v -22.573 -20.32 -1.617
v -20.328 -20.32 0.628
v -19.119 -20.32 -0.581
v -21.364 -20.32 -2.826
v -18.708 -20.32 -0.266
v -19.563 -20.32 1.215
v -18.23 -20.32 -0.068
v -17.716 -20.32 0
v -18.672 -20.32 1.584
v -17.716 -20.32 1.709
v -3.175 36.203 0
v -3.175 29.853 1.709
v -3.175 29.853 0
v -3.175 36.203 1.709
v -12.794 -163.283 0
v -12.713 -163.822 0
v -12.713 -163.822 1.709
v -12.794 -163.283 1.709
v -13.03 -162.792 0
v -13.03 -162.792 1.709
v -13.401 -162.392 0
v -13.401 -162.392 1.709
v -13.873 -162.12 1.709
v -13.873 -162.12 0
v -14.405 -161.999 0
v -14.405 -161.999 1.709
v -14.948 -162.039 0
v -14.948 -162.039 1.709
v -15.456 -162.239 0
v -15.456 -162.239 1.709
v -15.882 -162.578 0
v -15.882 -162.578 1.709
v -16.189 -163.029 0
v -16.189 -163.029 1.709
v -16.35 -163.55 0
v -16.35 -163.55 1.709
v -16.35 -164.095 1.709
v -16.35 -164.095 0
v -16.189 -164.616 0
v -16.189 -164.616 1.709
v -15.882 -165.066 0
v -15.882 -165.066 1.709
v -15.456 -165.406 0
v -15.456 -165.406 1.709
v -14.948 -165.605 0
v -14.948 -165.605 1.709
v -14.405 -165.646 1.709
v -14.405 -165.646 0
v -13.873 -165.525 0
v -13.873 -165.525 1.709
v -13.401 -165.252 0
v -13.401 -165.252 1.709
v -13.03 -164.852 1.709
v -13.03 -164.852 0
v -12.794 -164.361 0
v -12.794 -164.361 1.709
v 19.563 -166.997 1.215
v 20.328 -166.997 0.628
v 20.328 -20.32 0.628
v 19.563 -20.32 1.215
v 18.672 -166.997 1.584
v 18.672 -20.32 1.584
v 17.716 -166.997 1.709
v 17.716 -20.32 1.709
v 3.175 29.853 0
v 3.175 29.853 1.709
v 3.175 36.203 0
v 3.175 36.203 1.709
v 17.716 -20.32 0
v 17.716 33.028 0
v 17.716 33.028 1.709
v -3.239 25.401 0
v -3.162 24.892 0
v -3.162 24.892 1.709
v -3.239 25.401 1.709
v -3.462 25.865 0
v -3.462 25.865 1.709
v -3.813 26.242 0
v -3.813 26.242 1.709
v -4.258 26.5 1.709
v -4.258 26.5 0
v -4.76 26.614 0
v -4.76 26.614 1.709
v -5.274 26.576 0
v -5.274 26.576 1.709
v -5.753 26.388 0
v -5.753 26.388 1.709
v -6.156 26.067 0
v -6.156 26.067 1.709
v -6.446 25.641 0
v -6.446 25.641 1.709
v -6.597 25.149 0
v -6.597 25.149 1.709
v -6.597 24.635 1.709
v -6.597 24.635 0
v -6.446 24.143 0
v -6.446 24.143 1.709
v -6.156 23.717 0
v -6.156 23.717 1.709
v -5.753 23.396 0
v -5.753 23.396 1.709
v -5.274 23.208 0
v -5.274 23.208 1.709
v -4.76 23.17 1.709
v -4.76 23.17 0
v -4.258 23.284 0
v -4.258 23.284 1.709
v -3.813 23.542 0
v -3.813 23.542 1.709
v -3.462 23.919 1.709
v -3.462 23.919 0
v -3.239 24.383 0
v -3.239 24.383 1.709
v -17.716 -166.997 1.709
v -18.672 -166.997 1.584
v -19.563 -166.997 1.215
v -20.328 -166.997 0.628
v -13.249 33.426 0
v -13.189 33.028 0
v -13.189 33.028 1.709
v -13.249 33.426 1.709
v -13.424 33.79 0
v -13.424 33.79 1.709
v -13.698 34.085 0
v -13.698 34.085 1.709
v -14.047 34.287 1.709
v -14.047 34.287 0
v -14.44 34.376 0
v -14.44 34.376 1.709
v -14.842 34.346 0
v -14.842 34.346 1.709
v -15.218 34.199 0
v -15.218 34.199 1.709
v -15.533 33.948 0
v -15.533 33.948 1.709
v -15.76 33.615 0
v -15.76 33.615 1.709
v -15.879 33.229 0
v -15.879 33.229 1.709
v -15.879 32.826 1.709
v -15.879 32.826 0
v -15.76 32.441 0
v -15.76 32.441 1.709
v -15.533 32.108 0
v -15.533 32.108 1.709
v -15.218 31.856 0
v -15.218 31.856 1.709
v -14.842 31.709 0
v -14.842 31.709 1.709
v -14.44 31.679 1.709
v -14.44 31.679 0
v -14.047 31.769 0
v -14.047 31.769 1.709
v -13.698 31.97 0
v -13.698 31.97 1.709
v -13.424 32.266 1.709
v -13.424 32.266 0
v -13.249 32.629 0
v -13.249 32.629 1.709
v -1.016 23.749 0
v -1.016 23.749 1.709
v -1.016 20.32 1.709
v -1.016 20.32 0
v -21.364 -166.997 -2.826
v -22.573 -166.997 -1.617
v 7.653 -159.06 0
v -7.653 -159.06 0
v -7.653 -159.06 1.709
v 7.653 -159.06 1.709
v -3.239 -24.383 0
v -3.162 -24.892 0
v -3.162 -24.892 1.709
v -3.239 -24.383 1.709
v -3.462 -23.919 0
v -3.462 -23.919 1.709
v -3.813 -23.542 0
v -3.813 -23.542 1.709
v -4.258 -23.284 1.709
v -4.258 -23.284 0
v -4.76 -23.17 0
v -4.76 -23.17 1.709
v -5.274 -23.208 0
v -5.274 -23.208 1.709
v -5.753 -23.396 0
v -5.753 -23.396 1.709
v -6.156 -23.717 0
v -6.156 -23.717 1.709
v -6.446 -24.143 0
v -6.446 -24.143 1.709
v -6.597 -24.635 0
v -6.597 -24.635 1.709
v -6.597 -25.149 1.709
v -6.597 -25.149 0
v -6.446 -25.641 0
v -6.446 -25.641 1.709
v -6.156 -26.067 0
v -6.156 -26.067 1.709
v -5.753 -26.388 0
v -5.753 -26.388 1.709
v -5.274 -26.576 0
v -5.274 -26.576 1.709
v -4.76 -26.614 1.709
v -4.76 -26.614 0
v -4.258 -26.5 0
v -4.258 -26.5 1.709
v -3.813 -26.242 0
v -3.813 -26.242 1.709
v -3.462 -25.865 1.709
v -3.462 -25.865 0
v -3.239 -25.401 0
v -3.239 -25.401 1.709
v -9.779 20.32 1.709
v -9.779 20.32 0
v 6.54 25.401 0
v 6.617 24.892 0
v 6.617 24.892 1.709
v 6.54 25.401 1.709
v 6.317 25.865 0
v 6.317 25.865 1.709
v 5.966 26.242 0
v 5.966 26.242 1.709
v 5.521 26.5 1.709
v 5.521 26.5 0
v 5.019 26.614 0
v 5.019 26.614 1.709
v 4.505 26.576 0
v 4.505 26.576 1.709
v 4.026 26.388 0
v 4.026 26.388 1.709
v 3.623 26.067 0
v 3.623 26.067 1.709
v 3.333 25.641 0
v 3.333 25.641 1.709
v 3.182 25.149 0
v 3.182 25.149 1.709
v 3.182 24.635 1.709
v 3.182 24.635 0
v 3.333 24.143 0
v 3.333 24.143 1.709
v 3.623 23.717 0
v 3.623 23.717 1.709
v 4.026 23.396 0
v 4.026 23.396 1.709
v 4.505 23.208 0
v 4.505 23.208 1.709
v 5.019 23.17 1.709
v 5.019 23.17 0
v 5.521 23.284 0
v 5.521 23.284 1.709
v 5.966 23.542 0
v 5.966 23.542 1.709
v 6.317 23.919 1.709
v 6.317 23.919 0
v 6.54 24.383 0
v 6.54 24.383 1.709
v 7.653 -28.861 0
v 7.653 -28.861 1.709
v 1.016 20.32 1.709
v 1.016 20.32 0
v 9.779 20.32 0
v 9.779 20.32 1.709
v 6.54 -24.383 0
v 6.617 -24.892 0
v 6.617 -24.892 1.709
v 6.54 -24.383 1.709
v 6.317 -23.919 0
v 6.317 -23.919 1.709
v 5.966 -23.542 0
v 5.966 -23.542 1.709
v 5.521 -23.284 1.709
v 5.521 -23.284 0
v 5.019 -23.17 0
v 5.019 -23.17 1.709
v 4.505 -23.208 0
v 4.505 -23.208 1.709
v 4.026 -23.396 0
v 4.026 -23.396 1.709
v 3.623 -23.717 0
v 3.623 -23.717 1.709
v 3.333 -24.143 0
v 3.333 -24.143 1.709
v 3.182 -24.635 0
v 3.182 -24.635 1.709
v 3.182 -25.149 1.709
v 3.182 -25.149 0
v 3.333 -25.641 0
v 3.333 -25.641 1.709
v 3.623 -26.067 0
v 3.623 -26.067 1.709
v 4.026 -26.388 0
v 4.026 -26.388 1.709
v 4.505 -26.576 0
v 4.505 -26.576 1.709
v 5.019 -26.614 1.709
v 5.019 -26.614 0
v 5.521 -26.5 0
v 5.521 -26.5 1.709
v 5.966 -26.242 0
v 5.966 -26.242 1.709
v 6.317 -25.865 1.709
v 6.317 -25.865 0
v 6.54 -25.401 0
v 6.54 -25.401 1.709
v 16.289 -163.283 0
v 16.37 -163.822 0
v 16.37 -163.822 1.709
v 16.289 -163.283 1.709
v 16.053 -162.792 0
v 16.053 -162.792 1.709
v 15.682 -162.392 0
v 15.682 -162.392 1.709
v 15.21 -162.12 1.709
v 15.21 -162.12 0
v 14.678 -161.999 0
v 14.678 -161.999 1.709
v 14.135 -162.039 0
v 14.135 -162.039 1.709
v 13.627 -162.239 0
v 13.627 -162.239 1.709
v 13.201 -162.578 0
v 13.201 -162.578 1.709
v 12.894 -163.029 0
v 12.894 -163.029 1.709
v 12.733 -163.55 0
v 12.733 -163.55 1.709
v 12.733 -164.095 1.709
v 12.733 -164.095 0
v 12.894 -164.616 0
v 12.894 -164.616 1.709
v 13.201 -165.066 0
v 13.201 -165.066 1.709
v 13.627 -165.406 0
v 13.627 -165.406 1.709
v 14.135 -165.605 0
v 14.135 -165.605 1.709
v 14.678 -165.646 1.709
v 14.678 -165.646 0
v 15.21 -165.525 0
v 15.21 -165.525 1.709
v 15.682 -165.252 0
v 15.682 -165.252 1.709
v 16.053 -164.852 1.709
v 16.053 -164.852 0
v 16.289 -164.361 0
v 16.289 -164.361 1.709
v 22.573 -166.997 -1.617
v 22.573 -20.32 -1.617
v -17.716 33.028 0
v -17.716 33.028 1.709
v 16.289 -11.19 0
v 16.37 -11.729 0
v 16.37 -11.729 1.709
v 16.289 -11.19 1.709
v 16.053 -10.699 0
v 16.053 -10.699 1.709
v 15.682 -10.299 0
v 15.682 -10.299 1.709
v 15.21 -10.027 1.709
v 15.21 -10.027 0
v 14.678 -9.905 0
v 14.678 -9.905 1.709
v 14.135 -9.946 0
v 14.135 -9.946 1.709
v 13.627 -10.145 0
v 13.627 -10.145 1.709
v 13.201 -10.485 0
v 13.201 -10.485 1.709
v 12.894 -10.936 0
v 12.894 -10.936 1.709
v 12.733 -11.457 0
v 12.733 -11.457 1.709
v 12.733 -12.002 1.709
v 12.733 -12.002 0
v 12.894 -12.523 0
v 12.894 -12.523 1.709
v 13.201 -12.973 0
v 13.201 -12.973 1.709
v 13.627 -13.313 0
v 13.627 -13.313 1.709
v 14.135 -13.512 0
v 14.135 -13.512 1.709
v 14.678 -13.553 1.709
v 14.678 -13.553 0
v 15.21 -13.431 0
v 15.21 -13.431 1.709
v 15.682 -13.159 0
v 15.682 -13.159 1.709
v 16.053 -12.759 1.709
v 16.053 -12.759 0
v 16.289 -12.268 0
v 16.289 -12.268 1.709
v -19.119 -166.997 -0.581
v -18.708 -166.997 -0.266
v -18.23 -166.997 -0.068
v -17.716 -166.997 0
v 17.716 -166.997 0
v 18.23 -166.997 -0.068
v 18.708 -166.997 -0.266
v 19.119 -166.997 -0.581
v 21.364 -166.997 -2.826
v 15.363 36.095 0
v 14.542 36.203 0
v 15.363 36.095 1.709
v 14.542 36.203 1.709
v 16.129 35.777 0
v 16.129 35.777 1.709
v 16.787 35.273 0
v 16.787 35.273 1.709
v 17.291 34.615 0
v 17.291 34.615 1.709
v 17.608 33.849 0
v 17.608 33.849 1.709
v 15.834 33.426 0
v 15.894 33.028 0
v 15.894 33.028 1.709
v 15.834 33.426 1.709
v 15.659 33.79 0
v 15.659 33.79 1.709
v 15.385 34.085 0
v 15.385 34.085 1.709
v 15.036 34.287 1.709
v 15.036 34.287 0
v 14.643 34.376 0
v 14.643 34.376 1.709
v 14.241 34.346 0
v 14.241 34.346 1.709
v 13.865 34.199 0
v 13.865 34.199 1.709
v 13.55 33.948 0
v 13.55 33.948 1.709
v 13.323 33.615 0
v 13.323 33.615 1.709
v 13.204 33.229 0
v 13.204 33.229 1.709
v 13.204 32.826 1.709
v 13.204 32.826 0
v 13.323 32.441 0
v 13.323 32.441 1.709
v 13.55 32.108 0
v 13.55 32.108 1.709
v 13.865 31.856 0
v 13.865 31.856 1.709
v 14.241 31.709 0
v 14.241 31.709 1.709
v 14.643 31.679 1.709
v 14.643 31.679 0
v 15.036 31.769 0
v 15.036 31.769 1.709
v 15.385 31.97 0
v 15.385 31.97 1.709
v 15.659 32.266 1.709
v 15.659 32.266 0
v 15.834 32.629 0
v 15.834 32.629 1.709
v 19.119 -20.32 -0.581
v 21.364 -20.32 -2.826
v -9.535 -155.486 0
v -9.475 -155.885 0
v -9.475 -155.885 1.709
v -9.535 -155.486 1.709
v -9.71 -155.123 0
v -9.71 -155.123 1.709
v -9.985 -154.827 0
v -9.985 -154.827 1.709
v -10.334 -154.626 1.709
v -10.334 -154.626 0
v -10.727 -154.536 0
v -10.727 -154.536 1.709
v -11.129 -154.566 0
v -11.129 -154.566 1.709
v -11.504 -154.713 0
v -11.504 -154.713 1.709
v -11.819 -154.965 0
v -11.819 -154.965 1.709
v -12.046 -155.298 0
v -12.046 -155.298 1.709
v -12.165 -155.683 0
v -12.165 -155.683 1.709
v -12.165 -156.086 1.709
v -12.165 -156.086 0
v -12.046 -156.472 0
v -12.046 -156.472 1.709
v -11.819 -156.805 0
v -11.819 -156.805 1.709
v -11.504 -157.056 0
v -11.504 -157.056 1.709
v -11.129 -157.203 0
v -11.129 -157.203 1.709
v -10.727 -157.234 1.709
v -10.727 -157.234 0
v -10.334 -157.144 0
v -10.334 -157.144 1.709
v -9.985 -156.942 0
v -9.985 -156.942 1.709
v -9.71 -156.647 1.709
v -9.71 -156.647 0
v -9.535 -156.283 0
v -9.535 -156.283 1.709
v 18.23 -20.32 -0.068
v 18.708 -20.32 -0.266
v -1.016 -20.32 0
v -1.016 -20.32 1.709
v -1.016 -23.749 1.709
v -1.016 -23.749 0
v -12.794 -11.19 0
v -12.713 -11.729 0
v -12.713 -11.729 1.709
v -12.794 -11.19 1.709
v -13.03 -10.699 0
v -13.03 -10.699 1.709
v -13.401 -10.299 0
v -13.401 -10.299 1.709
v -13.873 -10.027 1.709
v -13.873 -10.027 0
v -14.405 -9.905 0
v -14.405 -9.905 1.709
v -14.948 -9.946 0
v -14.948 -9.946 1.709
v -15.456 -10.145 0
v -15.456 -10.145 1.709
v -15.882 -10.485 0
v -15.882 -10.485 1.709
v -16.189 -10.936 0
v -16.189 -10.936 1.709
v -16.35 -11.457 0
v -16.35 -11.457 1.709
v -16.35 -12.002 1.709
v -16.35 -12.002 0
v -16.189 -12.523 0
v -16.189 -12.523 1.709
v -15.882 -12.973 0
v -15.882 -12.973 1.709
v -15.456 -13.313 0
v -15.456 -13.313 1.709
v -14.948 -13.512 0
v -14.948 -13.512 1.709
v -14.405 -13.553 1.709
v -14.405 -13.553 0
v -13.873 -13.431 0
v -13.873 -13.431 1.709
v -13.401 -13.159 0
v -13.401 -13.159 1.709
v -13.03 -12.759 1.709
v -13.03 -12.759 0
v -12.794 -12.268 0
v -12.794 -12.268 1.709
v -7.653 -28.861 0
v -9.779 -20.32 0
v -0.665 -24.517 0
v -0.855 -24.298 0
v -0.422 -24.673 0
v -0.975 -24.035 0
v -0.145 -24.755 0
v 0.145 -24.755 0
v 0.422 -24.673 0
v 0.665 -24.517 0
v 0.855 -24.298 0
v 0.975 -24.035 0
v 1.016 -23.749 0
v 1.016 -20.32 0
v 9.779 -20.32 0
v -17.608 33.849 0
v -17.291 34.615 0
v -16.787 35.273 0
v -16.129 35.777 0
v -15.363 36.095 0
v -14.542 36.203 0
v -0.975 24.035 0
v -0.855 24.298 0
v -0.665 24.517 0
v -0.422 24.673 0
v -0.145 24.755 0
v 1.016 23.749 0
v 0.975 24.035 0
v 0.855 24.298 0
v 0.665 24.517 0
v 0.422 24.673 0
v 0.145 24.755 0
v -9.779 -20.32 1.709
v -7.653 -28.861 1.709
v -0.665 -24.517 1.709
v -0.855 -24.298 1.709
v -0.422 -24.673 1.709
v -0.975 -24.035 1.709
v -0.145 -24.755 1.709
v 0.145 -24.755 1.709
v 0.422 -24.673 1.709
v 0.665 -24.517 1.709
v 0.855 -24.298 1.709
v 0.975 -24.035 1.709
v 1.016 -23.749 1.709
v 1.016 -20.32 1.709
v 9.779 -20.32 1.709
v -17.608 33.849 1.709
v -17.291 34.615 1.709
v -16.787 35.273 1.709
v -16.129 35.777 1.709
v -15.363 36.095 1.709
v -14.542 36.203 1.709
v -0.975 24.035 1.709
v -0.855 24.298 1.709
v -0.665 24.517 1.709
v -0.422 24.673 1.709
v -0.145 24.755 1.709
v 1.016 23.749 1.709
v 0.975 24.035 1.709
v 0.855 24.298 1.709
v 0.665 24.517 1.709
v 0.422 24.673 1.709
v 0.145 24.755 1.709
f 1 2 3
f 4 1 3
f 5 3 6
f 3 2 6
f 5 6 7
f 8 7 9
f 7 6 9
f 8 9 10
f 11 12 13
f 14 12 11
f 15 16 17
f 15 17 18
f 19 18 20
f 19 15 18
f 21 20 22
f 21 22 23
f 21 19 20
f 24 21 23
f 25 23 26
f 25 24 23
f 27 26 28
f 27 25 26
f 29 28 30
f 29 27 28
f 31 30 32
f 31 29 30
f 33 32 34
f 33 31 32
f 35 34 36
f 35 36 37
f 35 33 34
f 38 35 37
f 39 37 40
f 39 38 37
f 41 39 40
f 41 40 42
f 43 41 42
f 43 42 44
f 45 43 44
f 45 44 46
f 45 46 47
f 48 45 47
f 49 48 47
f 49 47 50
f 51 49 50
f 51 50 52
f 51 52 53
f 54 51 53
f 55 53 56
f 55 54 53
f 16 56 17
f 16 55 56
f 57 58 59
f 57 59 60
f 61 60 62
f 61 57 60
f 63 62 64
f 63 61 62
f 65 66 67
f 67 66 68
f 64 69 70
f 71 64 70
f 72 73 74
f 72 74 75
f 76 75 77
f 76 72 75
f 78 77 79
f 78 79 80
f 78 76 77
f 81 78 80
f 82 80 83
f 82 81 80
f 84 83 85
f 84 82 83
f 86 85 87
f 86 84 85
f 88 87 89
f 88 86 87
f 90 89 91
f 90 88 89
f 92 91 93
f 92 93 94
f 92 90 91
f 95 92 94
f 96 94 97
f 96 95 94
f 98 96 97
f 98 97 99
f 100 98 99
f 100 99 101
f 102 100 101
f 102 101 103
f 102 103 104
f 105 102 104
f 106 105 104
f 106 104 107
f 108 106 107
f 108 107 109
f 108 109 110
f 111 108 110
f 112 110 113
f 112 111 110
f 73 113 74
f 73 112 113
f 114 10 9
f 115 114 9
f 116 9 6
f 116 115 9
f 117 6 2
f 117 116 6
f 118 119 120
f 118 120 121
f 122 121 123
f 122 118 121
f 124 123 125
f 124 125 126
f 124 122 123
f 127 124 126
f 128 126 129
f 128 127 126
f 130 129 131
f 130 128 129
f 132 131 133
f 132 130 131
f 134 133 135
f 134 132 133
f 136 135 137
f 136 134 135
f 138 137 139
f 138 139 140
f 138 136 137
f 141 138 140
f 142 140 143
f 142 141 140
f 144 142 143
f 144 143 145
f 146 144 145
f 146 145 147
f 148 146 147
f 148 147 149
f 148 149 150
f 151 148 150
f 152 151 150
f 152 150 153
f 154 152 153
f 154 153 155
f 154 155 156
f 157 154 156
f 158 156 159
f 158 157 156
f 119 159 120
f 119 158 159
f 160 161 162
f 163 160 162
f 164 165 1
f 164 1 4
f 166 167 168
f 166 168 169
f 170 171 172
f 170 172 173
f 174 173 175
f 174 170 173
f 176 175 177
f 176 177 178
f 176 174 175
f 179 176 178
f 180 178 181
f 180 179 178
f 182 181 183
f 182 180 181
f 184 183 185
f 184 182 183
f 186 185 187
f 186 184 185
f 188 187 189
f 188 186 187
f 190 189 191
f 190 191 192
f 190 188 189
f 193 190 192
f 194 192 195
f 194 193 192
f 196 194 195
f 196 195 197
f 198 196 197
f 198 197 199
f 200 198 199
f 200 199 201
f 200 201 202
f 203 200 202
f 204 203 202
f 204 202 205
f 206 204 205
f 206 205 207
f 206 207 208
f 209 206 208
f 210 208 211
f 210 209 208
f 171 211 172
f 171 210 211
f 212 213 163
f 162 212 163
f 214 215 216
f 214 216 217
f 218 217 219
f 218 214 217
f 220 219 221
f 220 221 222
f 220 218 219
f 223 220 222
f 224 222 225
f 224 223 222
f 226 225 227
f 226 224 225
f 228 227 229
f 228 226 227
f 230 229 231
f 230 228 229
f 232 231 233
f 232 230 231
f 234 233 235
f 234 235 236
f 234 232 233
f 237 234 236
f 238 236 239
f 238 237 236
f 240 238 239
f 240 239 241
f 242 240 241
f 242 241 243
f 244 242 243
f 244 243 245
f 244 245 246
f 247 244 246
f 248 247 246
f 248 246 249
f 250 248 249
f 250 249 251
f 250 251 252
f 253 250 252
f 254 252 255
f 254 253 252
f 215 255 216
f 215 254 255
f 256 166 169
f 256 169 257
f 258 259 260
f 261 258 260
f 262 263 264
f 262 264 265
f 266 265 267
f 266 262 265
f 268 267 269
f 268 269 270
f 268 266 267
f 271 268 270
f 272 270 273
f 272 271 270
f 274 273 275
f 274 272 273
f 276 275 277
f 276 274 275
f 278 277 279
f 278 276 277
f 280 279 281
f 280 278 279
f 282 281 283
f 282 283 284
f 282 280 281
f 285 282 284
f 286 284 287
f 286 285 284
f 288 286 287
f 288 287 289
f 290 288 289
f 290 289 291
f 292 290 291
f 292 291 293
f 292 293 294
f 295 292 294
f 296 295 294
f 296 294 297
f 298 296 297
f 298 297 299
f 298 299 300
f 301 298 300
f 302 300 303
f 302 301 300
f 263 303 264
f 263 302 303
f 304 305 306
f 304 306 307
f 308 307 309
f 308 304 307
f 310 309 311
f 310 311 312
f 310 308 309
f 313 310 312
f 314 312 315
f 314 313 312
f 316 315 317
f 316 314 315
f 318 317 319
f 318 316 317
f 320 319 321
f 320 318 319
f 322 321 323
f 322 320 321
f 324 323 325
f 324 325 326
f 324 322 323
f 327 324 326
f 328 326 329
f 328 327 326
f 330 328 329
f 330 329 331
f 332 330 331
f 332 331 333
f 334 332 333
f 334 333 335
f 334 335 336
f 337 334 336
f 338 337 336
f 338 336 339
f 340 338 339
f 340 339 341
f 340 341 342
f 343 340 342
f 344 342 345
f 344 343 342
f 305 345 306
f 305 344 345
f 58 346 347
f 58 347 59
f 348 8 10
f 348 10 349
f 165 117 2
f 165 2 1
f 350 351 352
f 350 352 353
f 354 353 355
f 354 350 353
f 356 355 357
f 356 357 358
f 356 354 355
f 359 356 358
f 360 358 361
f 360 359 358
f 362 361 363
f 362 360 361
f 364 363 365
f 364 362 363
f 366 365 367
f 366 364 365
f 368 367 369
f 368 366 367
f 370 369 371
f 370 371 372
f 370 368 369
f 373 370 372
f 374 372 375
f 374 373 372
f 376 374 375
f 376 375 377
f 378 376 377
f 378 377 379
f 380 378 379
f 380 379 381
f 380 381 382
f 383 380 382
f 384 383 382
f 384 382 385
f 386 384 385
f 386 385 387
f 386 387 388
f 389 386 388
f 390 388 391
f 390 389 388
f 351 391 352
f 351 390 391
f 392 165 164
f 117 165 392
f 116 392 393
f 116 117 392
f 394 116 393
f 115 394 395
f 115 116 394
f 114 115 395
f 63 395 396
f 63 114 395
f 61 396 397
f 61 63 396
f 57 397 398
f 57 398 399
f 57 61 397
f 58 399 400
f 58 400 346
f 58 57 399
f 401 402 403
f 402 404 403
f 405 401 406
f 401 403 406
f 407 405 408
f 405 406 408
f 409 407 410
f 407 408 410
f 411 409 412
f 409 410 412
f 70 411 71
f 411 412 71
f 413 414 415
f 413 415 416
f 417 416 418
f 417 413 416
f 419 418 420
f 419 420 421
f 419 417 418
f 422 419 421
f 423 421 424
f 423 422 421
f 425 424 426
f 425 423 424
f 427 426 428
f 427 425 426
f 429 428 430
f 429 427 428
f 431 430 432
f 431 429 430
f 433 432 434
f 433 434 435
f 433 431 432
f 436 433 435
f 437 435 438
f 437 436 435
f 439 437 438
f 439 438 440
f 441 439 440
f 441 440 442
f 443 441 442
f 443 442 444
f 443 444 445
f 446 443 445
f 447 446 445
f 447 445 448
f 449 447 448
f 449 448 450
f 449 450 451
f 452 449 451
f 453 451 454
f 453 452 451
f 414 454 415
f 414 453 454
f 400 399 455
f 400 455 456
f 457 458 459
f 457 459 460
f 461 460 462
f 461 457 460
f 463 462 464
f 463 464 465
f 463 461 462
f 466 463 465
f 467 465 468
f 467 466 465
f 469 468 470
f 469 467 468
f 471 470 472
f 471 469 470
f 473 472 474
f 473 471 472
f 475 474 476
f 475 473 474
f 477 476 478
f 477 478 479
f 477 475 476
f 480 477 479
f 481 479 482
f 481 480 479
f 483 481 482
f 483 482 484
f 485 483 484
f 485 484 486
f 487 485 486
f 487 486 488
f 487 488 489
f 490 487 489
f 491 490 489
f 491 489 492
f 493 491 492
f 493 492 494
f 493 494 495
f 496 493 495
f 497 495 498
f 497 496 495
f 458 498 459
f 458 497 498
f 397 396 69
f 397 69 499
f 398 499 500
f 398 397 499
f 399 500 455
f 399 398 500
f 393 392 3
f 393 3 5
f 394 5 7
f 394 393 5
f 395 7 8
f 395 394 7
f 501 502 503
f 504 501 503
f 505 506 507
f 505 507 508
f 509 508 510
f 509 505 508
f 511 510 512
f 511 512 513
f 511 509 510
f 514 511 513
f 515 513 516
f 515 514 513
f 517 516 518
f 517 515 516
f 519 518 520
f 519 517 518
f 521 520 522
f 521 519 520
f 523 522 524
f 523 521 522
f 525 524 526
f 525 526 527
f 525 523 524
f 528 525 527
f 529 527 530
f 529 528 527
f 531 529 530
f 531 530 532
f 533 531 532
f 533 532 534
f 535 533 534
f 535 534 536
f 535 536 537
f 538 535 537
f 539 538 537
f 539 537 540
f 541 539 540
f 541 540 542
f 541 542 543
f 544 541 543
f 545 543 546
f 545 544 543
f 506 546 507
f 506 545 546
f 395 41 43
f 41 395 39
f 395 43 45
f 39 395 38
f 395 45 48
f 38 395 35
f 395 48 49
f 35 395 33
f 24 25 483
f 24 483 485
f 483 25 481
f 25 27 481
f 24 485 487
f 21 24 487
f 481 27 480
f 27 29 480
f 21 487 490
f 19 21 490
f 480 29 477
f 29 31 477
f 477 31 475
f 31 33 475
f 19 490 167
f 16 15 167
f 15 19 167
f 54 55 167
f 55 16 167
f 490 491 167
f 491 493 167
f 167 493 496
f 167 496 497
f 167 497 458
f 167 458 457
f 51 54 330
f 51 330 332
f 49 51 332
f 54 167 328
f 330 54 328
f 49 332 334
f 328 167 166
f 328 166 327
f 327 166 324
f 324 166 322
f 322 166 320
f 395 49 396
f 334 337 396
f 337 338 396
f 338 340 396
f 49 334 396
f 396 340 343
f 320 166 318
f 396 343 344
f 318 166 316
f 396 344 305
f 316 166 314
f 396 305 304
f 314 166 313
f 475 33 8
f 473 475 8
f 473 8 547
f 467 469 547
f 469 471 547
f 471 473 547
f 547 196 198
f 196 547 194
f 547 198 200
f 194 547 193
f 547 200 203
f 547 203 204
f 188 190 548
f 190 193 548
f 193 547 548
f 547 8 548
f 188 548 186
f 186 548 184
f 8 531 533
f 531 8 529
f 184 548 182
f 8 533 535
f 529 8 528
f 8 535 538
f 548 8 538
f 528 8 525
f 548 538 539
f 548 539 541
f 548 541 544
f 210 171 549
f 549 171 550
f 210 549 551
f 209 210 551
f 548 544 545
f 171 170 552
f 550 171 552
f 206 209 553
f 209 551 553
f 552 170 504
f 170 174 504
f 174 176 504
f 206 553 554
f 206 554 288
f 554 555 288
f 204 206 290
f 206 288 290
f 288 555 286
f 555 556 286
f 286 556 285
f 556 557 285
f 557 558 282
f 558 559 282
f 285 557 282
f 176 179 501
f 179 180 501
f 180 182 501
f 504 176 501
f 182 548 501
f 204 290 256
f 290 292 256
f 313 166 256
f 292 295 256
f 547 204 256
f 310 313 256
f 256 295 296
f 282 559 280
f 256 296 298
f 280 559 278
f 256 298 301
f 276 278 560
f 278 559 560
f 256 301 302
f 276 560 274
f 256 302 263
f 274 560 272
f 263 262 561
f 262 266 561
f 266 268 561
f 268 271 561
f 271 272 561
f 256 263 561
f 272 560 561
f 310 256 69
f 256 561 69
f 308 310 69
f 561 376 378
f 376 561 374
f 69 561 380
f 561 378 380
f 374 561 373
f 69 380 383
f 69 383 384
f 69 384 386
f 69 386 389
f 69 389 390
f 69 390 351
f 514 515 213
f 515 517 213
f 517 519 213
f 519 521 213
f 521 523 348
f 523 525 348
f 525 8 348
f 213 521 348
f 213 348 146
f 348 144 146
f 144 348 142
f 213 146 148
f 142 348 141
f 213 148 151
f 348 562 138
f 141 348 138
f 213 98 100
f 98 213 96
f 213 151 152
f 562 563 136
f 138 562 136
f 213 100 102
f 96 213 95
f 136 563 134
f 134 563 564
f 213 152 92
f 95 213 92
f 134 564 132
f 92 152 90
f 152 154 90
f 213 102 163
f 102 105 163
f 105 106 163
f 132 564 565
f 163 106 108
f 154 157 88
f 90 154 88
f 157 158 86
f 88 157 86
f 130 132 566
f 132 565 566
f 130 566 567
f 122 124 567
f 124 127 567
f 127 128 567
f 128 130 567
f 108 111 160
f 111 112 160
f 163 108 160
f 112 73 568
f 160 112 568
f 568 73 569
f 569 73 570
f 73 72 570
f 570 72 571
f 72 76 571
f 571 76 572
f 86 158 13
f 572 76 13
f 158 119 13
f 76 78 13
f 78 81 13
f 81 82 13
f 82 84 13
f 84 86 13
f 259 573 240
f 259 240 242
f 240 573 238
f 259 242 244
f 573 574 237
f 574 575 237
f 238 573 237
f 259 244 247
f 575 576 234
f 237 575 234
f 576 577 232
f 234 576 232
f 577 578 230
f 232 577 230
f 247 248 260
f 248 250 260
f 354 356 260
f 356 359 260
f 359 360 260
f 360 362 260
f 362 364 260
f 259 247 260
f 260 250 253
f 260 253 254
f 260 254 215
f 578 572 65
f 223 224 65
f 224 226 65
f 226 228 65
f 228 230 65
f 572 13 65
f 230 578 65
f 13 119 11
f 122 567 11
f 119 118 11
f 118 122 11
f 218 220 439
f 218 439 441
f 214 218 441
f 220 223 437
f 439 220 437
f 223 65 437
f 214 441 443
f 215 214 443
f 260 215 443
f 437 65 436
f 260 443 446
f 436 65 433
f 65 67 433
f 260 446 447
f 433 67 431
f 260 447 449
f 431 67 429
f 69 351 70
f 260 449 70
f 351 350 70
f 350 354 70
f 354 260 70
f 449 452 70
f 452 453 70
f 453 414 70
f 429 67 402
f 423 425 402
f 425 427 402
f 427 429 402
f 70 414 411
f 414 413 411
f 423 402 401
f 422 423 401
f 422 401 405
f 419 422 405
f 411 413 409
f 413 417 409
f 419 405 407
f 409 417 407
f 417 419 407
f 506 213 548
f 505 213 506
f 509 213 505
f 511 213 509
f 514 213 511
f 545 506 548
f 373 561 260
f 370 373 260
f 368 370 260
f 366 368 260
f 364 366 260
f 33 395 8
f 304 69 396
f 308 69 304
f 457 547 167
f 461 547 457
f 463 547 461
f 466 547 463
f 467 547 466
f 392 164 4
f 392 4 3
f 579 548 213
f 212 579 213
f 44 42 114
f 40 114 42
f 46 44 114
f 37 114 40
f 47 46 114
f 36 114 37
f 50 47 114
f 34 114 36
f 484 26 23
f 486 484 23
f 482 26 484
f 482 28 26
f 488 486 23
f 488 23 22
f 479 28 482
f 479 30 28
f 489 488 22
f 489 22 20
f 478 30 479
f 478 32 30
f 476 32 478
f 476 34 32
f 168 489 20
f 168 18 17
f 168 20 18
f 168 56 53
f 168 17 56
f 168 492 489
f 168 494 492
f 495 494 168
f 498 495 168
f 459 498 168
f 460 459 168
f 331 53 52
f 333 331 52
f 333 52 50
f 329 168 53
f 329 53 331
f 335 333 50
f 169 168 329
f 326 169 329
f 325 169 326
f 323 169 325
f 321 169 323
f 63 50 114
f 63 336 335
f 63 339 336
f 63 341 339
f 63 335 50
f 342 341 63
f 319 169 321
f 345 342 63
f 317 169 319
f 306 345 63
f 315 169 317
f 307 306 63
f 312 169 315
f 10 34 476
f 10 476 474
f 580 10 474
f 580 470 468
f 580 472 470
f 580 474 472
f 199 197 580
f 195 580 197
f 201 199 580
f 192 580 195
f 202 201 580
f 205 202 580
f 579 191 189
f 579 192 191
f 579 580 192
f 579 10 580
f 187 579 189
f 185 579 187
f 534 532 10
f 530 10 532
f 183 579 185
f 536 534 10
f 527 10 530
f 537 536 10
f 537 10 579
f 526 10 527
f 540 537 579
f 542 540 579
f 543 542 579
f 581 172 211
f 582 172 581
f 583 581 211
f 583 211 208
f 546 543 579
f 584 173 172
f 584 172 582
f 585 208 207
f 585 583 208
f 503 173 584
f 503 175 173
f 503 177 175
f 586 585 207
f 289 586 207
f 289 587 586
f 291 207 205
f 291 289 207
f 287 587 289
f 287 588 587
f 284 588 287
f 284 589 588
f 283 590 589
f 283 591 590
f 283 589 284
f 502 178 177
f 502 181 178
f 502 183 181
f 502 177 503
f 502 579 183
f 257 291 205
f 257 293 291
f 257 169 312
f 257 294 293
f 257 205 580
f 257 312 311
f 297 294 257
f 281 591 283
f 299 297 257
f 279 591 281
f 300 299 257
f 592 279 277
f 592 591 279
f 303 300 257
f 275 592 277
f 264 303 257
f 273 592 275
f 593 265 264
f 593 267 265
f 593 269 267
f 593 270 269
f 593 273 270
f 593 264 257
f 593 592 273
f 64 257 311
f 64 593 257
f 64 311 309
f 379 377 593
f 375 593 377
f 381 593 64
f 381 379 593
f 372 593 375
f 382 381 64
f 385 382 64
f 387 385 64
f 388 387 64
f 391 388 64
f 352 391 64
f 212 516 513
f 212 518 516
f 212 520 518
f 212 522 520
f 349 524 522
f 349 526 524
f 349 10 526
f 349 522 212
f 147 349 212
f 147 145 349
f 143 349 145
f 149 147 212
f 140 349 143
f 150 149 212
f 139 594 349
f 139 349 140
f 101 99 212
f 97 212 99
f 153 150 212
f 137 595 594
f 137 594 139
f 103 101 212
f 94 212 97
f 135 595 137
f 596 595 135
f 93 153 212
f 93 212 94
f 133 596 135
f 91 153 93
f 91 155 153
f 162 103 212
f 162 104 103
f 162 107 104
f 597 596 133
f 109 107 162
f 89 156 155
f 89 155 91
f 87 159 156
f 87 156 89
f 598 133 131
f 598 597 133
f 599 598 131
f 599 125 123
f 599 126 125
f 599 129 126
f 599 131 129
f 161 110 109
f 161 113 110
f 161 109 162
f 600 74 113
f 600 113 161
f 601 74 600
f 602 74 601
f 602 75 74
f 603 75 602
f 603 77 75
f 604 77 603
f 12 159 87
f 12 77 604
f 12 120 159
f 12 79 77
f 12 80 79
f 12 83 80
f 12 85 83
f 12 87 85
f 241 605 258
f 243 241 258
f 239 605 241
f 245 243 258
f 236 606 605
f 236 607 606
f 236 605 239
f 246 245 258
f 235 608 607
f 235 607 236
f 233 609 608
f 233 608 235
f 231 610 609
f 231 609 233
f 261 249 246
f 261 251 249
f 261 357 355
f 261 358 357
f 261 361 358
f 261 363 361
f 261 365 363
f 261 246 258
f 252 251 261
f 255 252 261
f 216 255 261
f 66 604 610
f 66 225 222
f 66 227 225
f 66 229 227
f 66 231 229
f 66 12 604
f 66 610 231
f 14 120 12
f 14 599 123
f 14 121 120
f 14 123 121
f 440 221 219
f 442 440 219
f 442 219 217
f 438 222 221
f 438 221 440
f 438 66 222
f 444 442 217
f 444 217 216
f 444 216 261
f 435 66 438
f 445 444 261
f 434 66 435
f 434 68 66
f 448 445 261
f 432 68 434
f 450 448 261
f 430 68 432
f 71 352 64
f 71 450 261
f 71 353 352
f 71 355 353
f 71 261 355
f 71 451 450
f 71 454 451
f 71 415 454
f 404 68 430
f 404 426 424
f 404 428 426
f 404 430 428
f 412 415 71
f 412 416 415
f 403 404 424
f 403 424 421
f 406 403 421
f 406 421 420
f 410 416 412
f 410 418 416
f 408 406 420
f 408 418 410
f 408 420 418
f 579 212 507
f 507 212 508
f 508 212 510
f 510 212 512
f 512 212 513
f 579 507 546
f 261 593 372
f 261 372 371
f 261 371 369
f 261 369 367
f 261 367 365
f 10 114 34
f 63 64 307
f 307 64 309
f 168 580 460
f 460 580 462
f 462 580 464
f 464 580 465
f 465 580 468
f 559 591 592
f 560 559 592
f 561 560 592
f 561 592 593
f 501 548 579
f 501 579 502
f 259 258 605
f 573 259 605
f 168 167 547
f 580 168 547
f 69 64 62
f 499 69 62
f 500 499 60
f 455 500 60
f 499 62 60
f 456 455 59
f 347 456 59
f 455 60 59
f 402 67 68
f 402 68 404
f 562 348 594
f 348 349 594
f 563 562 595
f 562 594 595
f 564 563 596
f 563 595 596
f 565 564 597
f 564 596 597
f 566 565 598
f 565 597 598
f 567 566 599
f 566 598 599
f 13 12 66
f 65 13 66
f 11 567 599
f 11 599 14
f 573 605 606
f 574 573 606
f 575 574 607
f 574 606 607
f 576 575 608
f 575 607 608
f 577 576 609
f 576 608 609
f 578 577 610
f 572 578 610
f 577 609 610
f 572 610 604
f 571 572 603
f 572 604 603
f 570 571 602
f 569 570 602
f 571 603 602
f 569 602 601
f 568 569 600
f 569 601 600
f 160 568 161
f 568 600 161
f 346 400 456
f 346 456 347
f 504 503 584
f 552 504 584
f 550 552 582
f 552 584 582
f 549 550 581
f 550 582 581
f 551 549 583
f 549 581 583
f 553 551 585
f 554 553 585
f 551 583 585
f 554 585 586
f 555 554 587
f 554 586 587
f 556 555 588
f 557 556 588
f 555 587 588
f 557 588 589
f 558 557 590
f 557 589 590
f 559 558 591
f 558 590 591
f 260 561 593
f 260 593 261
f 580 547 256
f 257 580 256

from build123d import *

# Parameters (mm, degrees)
F0_W     = 35.433
F0_H     = 203.2
F0_R     = 1.8288
F0_R_2   = 1.35255
F0_W_2   = 15.305659
F0_H_2   = 130.1990486724
F0_R_3   = 1.7272
F0_W_3   = 19.558
F0_H_3   = 40.64
F1_DEPTH = 1.70942
F3_DEPTH = 146.6772986724
F4_R     = 3.175
F5_W     = 6.35
F5_H     = 6.35
F6_DEPTH = 1.70942


with BuildPart() as f1:
    # F0 (on Top) → F1 (new body)
    with BuildSketch(Plane.XY):
        with Locations((0, -65.3972986724)):
            Rectangle(F0_W, F0_H)
        with Locations((-14.5415, -163.8222986724)):
            Circle(F0_R, mode=Mode.SUBTRACT)
        with Locations((-10.8278295, -155.8847986724)):
            Circle(F0_R_2, mode=Mode.SUBTRACT)
        with Locations((14.5415, -163.8222986724)):
            Circle(F0_R, mode=Mode.SUBTRACT)
        with Locations((0, -93.9602743362)):
            Rectangle(F0_W_2, F0_H_2, mode=Mode.SUBTRACT)
        with Locations((-4.8895, -24.892)):
            Circle(F0_R_3, mode=Mode.SUBTRACT)
        with Locations((-14.5415, -11.7291104)):
            Circle(F0_R, mode=Mode.SUBTRACT)
        with Locations((-14.5415, 33.0277013276)):
            Circle(F0_R_2, mode=Mode.SUBTRACT)
        with Locations((-4.8895, 24.892)):
            Circle(F0_R_3, mode=Mode.SUBTRACT)
        with Locations((4.8895, -24.892)):
            Circle(F0_R_3, mode=Mode.SUBTRACT)
        Rectangle(F0_W_3, F0_H_3, mode=Mode.SUBTRACT)
        with Locations((4.8895, 24.892)):
            Circle(F0_R_3, mode=Mode.SUBTRACT)
        with Locations((14.5415, -11.7291104)):
            Circle(F0_R, mode=Mode.SUBTRACT)
        with Locations((14.5415, 33.0277013276)):
            Circle(F0_R_2, mode=Mode.SUBTRACT)
    extrude(amount=F1_DEPTH)

    # F2 (on face) → F3 (join, through all)
    with BuildSketch(Plane.XZ.offset(166.9972986724)):
        with BuildLine():
            ThreePointArc((-19.1192160061, -0.5810239939), (-18.4756444321, -0.1510032162), (-17.7165, 0))
            Line((-17.7165, 0), (-17.7165, 1.70942))
            ThreePointArc((-17.7165, 1.70942), (-19.1298111451, 1.4282949343), (-20.32795848, 0.62771848))
            Line((-20.32795848, 0.62771848), (-22.5730225103, -1.6173455503))
            Line((-22.5730225103, -1.6173455503), (-21.3642800364, -2.8260880242))
            Line((-21.3642800364, -2.8260880242), (-19.1192160061, -0.5810239939))
        make_face()
        with BuildLine():
            Line((17.7165, 1.70942), (17.7165, 0))
            ThreePointArc((17.7165, 0), (18.4756444321, -0.1510032162), (19.1192160061, -0.5810239939))
            Line((19.1192160061, -0.5810239939), (21.3642800364, -2.8260880242))
            Line((21.3642800364, -2.8260880242), (22.5730225103, -1.6173455503))
            Line((22.5730225103, -1.6173455503), (20.32795848, 0.62771848))
            ThreePointArc((20.32795848, 0.62771848), (19.1298111451, 1.4282949343), (17.7165, 1.70942))
        make_face()
    extrude(amount=-F3_DEPTH)

    # F4
    f4_edges = [f1.edges().sort_by_distance(p)[0] for p in [
        (17.7165, 36.202701, 0.85471),
        (-17.7165, 36.202701, 0.85471),
    ]]
    fillet(f4_edges, radius=F4_R)

    # F5 (on face) → F6 (cut, through all)
    with BuildSketch(Plane.XY.offset(1.70942)):
        with Locations((0, 33.0277013276)):
            Rectangle(F5_W, F5_H)
        with BuildLine():
            Line((1.016, -23.749), (1.016, -20.32))
            Line((1.016, -20.32), (-1.016, -20.32))
            Line((-1.016, -20.32), (-1.016, -23.749))
            ThreePointArc((-1.016, -23.749), (0, -24.765), (1.016, -23.749))
        make_face()
        with BuildLine():
            Line((-1.016, 20.32), (1.016, 20.32))
            Line((1.016, 20.32), (1.016, 23.749))
            ThreePointArc((1.016, 23.749), (0, 24.765), (-1.016, 23.749))
            Line((-1.016, 23.749), (-1.016, 20.32))
        make_face()
    extrude(amount=-F6_DEPTH, mode=Mode.SUBTRACT)


solid = f1.part
